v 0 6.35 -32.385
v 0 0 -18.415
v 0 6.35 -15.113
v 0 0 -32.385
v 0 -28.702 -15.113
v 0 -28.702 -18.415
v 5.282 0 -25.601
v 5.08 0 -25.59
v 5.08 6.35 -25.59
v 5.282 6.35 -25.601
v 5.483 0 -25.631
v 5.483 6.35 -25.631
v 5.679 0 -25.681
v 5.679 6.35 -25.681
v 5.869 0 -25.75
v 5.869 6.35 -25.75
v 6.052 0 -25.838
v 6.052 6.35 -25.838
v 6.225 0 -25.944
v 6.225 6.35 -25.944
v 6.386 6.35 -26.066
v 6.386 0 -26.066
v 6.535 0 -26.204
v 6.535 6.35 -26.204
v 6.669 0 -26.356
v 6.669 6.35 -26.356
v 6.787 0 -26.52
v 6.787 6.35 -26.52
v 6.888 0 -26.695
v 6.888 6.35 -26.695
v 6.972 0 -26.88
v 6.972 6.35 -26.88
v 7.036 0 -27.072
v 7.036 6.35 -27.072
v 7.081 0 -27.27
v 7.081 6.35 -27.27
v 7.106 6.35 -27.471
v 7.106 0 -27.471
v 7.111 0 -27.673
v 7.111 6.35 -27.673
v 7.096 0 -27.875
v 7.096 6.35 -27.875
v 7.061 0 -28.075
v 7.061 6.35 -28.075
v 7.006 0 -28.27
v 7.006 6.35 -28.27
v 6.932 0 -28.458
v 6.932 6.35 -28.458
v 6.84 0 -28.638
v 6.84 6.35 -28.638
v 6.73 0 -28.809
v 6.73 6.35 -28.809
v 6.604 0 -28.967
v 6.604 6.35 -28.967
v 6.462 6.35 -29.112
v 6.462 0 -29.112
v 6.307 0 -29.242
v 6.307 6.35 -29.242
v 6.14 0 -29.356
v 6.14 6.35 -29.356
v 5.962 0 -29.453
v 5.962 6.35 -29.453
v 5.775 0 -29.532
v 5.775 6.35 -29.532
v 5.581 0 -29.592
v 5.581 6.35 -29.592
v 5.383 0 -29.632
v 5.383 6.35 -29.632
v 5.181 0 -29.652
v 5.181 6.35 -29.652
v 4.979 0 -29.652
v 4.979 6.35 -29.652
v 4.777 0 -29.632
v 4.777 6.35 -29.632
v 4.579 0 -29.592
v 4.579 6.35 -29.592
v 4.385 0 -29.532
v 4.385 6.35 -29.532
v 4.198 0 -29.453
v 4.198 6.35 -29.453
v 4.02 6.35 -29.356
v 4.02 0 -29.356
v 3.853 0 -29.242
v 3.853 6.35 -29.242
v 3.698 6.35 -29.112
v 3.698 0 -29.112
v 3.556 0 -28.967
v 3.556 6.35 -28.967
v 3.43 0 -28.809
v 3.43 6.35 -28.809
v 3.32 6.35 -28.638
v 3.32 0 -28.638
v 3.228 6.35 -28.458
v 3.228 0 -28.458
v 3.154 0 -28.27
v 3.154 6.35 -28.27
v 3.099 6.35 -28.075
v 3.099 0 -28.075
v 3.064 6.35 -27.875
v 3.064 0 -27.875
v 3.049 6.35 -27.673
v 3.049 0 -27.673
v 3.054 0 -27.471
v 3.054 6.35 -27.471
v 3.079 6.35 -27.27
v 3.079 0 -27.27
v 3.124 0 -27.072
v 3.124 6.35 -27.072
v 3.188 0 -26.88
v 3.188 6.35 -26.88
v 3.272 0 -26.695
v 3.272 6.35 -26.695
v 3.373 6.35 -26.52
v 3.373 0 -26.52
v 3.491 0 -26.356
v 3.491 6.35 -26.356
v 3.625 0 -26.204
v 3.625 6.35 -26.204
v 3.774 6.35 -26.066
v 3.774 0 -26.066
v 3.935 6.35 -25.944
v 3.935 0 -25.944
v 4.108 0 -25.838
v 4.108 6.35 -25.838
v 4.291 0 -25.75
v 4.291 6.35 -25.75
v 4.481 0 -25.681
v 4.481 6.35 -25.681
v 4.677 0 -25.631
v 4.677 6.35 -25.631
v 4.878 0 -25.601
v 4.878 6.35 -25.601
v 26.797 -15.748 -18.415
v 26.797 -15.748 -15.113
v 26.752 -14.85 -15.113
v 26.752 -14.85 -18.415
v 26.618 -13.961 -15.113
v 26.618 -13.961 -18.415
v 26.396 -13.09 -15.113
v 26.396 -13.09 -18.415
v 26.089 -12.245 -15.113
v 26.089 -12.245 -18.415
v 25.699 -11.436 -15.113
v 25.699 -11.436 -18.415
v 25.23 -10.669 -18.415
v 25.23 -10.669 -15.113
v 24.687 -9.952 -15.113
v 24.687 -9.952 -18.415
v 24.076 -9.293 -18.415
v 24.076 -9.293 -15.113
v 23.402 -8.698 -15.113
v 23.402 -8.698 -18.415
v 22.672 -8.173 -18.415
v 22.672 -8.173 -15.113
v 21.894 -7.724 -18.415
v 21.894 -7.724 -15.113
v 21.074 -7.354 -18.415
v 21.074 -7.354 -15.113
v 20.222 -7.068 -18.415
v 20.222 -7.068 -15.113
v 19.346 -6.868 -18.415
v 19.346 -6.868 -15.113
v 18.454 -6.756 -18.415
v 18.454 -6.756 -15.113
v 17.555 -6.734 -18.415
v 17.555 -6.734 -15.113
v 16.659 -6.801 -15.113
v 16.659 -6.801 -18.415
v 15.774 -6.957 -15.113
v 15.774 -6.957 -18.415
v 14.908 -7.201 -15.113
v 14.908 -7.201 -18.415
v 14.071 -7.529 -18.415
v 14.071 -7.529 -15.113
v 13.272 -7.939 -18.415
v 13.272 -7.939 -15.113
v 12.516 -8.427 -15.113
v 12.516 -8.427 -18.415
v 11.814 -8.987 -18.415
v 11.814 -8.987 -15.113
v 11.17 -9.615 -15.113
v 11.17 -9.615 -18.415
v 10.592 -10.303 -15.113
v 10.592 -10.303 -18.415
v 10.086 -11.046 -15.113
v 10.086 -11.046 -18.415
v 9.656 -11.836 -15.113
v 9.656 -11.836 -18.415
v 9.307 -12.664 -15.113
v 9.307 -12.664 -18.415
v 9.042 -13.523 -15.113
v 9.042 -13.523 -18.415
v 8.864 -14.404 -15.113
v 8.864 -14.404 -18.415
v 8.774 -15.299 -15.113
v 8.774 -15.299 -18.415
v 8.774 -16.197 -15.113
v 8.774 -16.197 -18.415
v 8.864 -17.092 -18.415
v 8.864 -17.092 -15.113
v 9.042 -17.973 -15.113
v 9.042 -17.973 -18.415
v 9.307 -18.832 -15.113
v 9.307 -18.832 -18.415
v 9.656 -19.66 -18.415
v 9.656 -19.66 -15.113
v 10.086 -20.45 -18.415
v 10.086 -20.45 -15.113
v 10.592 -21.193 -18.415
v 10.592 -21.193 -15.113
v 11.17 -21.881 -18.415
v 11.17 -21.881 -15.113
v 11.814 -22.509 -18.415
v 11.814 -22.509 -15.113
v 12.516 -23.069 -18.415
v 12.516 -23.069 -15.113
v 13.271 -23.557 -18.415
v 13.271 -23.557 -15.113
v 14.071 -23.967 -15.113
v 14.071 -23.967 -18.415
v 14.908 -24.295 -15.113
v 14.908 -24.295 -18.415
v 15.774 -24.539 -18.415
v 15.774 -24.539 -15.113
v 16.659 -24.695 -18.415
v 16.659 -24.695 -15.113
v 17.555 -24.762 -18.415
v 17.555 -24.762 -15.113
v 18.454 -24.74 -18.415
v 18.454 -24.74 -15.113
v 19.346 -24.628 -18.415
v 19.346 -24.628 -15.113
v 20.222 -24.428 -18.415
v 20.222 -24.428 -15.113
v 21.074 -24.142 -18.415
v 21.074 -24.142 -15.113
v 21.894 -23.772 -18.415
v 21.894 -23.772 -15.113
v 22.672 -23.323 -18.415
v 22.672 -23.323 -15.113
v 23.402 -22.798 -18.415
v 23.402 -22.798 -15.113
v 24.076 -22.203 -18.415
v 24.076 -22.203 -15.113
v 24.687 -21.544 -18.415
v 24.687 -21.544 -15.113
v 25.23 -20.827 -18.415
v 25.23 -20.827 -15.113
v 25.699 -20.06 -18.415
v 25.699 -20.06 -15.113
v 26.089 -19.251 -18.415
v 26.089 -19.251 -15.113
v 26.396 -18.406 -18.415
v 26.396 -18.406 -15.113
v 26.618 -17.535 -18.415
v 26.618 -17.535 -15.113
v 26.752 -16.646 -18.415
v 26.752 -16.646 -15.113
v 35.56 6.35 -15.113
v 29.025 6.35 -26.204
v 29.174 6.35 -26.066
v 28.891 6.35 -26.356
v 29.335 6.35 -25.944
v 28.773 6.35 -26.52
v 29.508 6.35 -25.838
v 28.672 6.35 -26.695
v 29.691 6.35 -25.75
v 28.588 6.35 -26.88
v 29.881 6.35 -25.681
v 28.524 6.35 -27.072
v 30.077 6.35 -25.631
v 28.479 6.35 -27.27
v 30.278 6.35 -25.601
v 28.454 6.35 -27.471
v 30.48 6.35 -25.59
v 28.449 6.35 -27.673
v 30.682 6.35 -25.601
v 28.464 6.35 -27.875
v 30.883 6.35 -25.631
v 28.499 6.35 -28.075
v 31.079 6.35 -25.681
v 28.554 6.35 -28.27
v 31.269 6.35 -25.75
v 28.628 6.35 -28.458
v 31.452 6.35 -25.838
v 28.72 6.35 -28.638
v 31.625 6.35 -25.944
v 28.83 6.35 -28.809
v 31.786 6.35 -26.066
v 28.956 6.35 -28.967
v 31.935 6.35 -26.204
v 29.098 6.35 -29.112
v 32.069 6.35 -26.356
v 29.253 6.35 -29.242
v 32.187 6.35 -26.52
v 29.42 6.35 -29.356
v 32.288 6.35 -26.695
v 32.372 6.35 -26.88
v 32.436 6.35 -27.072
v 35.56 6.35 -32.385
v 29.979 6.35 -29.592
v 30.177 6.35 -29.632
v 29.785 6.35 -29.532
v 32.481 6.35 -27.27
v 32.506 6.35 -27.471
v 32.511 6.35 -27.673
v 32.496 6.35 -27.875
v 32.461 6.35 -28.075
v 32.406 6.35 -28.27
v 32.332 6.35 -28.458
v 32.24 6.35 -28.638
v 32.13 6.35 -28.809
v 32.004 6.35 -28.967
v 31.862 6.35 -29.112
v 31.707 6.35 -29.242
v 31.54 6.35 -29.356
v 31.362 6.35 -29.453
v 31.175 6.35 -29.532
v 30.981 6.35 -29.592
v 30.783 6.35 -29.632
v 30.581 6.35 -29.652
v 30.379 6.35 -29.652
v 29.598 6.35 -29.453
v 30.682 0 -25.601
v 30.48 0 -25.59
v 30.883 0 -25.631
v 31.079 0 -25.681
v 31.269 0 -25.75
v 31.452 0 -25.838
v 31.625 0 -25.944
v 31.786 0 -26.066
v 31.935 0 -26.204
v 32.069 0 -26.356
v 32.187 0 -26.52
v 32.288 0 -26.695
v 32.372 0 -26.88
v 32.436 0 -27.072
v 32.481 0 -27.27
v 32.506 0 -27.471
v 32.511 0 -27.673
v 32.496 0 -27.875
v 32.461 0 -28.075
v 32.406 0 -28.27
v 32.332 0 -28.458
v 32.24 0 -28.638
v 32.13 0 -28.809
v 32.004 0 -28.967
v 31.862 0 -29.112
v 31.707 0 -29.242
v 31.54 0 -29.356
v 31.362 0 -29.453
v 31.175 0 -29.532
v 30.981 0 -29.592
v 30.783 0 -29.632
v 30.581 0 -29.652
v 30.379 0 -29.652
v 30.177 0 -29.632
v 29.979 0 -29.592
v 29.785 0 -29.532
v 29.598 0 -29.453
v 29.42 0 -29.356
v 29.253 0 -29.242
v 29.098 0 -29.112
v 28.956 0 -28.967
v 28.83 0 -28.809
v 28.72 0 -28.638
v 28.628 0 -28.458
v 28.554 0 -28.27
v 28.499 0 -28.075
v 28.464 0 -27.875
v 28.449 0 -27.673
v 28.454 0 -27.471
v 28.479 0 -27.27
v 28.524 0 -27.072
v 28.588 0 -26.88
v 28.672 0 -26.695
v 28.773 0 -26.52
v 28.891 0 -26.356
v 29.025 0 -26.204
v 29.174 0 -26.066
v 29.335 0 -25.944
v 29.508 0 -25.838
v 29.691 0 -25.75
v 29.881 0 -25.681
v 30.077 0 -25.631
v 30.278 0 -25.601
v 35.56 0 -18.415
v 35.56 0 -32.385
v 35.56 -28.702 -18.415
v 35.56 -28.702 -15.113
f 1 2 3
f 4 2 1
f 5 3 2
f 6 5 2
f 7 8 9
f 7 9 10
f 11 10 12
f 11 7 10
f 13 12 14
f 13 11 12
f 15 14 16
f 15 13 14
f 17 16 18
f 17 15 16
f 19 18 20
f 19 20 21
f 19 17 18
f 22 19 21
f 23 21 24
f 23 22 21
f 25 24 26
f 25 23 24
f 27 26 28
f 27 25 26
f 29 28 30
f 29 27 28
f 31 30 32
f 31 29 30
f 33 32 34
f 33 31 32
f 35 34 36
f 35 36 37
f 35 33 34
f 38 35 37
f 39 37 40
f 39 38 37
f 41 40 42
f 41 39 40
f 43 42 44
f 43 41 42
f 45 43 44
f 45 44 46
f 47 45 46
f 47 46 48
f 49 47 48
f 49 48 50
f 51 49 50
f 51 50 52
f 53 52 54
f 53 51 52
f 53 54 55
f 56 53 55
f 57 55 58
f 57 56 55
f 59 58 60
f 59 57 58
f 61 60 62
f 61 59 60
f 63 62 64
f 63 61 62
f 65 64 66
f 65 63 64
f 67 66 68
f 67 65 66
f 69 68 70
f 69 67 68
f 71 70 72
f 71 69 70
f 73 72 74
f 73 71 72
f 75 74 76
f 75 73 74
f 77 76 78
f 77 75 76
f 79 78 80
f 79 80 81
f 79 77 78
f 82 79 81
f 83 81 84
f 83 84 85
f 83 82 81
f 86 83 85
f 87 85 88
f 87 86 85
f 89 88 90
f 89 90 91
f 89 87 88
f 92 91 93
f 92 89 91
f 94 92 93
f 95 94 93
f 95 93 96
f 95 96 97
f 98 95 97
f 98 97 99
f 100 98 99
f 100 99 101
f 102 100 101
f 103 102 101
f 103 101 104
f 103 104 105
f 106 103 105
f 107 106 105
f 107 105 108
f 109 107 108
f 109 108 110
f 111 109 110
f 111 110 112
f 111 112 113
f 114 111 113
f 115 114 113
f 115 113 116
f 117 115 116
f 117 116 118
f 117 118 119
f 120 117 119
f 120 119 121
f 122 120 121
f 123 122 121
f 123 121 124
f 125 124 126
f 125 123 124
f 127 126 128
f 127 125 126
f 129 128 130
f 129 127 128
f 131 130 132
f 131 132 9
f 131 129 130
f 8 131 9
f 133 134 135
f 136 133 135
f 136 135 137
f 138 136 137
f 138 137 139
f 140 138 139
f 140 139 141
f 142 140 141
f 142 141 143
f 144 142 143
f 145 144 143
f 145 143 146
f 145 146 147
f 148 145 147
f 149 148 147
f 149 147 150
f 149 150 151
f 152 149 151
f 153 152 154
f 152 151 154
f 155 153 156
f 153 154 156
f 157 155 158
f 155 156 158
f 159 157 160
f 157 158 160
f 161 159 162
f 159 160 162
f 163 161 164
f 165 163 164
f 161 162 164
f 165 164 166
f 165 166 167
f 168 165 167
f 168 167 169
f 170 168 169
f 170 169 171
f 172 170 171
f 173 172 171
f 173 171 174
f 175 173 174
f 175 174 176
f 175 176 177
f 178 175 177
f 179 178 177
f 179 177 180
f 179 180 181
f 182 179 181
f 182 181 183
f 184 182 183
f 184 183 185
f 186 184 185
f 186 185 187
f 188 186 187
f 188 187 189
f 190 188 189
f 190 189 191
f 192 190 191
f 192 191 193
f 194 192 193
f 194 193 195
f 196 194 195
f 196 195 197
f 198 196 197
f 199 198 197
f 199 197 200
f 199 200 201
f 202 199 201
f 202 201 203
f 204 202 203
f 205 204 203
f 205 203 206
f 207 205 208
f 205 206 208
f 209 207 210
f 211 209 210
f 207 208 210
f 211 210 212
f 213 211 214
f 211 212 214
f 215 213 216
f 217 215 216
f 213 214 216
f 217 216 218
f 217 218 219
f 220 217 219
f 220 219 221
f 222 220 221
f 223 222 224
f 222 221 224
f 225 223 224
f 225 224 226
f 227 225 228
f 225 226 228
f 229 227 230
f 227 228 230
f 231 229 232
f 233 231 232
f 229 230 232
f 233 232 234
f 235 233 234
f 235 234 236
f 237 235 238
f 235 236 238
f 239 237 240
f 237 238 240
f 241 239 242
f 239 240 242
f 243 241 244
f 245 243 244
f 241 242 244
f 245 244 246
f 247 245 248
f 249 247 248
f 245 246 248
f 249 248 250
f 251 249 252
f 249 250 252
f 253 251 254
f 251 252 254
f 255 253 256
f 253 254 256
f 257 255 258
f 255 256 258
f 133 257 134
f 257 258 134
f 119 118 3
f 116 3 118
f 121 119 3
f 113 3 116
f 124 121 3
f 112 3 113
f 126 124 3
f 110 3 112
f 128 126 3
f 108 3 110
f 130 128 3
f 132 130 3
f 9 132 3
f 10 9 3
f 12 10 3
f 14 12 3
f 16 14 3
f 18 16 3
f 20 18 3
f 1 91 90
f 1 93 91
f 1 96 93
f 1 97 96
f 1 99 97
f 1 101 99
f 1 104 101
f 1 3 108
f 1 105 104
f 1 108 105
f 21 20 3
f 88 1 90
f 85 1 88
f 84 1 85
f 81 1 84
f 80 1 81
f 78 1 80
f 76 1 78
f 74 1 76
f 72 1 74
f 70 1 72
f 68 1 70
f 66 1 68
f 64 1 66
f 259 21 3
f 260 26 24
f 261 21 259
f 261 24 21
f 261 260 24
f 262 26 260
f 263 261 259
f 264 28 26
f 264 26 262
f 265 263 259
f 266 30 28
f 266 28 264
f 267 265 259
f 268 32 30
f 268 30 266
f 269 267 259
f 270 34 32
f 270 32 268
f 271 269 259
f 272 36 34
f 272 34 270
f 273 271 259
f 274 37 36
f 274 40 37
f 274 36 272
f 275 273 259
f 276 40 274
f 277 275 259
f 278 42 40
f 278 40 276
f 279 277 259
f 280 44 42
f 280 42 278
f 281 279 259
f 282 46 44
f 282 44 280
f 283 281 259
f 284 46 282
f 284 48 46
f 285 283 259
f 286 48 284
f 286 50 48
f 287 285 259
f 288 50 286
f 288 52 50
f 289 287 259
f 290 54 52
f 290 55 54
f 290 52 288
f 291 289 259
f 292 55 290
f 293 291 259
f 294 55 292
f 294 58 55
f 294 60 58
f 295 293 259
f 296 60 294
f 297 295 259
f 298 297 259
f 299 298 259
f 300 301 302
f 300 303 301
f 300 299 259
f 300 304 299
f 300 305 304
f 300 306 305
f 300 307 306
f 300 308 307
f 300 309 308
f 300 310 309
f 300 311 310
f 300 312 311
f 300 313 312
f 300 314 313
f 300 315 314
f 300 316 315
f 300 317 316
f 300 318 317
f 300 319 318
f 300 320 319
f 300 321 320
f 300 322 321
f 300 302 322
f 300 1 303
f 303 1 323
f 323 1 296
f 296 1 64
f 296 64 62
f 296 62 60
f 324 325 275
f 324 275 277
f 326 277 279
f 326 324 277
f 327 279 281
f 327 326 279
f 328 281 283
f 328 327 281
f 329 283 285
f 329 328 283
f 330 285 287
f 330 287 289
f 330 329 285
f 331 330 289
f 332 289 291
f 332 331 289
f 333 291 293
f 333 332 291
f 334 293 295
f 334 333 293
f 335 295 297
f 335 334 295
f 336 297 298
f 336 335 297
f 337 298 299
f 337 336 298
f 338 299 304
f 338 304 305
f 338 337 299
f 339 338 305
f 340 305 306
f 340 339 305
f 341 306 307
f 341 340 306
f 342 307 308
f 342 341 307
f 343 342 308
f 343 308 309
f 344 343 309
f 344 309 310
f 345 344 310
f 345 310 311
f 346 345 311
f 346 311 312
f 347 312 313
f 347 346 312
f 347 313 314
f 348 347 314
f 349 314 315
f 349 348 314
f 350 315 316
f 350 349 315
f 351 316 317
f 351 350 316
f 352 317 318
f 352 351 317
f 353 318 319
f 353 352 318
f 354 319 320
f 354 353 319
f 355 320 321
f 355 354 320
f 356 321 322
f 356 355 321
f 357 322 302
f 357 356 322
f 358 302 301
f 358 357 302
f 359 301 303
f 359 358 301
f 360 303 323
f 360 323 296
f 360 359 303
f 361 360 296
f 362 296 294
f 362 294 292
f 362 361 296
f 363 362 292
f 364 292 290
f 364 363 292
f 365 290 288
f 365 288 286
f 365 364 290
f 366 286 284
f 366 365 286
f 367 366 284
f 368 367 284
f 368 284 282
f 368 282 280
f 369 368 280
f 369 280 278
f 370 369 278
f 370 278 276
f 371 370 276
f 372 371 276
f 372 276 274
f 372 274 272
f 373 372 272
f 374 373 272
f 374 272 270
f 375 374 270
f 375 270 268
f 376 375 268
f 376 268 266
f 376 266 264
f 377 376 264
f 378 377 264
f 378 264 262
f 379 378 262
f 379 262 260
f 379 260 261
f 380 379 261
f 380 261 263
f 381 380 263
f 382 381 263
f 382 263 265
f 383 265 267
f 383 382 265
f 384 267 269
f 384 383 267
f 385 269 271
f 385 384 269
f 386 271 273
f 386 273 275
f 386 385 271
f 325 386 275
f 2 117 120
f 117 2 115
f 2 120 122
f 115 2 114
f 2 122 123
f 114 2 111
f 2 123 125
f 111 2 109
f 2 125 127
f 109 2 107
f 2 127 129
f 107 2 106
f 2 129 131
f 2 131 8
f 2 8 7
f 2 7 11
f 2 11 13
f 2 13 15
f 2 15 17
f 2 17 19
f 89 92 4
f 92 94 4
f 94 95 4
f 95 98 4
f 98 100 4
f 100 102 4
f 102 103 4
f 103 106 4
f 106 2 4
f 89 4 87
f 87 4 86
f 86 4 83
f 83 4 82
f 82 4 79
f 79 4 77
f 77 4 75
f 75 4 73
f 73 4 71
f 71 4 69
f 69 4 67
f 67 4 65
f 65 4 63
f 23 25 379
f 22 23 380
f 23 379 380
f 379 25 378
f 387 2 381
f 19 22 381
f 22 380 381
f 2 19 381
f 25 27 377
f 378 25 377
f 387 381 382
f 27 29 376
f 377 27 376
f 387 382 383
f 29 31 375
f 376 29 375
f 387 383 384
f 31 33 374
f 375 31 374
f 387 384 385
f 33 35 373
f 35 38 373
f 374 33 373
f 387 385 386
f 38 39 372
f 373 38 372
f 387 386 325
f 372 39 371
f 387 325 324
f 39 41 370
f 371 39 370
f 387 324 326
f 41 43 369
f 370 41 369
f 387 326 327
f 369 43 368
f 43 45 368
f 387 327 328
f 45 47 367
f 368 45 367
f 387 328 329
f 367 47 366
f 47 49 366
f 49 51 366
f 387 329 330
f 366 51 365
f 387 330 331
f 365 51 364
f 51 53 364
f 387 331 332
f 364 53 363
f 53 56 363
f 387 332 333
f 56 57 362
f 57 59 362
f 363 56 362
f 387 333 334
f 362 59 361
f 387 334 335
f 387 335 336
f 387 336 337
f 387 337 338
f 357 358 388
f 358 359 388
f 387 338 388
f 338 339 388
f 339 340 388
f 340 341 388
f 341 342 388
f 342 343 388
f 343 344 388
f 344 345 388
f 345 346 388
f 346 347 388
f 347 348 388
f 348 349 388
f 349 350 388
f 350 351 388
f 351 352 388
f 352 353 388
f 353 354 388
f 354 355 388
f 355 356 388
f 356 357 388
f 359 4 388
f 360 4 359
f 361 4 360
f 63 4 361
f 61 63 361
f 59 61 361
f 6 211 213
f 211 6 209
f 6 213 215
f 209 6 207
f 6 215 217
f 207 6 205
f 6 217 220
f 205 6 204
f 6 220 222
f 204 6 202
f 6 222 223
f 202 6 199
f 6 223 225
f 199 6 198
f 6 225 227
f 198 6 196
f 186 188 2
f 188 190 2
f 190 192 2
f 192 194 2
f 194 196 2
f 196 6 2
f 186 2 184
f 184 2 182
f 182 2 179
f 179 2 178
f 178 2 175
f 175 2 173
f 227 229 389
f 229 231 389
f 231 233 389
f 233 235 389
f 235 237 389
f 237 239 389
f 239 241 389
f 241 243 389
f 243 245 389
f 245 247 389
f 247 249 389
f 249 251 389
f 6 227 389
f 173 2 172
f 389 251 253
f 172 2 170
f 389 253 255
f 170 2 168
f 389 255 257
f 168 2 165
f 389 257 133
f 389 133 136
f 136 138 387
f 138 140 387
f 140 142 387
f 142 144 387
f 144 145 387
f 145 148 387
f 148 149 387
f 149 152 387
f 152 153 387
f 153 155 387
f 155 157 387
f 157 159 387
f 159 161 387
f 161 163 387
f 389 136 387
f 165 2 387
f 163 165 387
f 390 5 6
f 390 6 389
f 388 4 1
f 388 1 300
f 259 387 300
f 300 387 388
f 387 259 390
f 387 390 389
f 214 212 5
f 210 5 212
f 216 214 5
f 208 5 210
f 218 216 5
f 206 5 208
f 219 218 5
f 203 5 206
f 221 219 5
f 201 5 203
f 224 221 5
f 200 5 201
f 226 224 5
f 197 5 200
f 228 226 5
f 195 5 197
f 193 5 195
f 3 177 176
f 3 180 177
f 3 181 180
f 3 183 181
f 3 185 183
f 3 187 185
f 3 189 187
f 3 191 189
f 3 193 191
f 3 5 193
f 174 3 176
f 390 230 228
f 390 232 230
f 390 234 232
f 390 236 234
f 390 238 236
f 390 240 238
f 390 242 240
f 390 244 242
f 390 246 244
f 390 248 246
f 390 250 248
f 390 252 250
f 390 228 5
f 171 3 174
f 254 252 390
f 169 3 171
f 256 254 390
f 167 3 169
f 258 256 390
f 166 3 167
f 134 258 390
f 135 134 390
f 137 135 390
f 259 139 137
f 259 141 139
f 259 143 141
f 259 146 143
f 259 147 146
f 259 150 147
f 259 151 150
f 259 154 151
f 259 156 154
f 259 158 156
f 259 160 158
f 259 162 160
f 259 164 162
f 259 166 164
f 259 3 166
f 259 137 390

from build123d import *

# Parameters (mm, degrees)
SKETCH11_W          = 35.56
SKETCH11_H          = 32.385
SKETCH11_R          = 2.032
BOSS_EXTRUDE1_DEPTH = 6.35
SKETCH14_W          = 35.56
SKETCH14_H          = 3.302
BOSS_EXTRUDE2_DEPTH = 28.702
CUT_EXTRUDE1_REACH  = 50.853
SKETCH15_R          = 9.017
SKETCH16_W          = 35.56
SKETCH16_H          = 15.113
CUT_EXTRUDE2_DEPTH  = 57.009879745


with BuildPart() as part:
    # Sketch11 → Boss-Extrude1 (new body)
    with BuildSketch(Plane(origin=(0, 0, 0), x_dir=(1, 0, 0), z_dir=(0, 1, 0))):
        with Locations((17.78, 16.1925)):
            Rectangle(SKETCH11_W, SKETCH11_H)
        with Locations(Location((5.08, 27.6225, 0), (0, 0, 270))):
            Circle(SKETCH11_R, mode=Mode.SUBTRACT)
        with Locations(Location((30.48, 27.6225, 0), (0, 0, 270))):
            Circle(SKETCH11_R, mode=Mode.SUBTRACT)
        with Locations(Location((17.78, 6.7945, 0), (0, 0, 270))):
            Circle(SKETCH11_R, mode=Mode.SUBTRACT)
    extrude(amount=BOSS_EXTRUDE1_DEPTH)

    # Sketch14 → Boss-Extrude2 (add)
    with BuildSketch(Plane.XZ):
        with Locations((17.78, -16.764)):
            Rectangle(SKETCH14_W, SKETCH14_H)
    extrude(amount=BOSS_EXTRUDE2_DEPTH)

    # Sketch15 → Cut-Extrude1 (cut, up to next)
    with BuildSketch(Plane.XY.offset(-15.113), mode=Mode.PRIVATE) as cut_extrude1_sk1:
        with Locations((17.78, -15.748)):
            Circle(SKETCH15_R)
    cut_extrude1_tool1 = extrude(cut_extrude1_sk1.sketch, amount=-CUT_EXTRUDE1_REACH, mode=Mode.PRIVATE) & part.part
    add(cut_extrude1_tool1.solids().sort_by_distance((17.78, -15.748, -15.113))[0], mode=Mode.SUBTRACT)

    # Sketch16 → Cut-Extrude2 (cut, through all)
    with BuildSketch(Plane.XZ):
        with Locations((17.78, -7.5565)):
            Rectangle(SKETCH16_W, SKETCH16_H)
    extrude(amount=-CUT_EXTRUDE2_DEPTH, mode=Mode.SUBTRACT)


solid = part.part
